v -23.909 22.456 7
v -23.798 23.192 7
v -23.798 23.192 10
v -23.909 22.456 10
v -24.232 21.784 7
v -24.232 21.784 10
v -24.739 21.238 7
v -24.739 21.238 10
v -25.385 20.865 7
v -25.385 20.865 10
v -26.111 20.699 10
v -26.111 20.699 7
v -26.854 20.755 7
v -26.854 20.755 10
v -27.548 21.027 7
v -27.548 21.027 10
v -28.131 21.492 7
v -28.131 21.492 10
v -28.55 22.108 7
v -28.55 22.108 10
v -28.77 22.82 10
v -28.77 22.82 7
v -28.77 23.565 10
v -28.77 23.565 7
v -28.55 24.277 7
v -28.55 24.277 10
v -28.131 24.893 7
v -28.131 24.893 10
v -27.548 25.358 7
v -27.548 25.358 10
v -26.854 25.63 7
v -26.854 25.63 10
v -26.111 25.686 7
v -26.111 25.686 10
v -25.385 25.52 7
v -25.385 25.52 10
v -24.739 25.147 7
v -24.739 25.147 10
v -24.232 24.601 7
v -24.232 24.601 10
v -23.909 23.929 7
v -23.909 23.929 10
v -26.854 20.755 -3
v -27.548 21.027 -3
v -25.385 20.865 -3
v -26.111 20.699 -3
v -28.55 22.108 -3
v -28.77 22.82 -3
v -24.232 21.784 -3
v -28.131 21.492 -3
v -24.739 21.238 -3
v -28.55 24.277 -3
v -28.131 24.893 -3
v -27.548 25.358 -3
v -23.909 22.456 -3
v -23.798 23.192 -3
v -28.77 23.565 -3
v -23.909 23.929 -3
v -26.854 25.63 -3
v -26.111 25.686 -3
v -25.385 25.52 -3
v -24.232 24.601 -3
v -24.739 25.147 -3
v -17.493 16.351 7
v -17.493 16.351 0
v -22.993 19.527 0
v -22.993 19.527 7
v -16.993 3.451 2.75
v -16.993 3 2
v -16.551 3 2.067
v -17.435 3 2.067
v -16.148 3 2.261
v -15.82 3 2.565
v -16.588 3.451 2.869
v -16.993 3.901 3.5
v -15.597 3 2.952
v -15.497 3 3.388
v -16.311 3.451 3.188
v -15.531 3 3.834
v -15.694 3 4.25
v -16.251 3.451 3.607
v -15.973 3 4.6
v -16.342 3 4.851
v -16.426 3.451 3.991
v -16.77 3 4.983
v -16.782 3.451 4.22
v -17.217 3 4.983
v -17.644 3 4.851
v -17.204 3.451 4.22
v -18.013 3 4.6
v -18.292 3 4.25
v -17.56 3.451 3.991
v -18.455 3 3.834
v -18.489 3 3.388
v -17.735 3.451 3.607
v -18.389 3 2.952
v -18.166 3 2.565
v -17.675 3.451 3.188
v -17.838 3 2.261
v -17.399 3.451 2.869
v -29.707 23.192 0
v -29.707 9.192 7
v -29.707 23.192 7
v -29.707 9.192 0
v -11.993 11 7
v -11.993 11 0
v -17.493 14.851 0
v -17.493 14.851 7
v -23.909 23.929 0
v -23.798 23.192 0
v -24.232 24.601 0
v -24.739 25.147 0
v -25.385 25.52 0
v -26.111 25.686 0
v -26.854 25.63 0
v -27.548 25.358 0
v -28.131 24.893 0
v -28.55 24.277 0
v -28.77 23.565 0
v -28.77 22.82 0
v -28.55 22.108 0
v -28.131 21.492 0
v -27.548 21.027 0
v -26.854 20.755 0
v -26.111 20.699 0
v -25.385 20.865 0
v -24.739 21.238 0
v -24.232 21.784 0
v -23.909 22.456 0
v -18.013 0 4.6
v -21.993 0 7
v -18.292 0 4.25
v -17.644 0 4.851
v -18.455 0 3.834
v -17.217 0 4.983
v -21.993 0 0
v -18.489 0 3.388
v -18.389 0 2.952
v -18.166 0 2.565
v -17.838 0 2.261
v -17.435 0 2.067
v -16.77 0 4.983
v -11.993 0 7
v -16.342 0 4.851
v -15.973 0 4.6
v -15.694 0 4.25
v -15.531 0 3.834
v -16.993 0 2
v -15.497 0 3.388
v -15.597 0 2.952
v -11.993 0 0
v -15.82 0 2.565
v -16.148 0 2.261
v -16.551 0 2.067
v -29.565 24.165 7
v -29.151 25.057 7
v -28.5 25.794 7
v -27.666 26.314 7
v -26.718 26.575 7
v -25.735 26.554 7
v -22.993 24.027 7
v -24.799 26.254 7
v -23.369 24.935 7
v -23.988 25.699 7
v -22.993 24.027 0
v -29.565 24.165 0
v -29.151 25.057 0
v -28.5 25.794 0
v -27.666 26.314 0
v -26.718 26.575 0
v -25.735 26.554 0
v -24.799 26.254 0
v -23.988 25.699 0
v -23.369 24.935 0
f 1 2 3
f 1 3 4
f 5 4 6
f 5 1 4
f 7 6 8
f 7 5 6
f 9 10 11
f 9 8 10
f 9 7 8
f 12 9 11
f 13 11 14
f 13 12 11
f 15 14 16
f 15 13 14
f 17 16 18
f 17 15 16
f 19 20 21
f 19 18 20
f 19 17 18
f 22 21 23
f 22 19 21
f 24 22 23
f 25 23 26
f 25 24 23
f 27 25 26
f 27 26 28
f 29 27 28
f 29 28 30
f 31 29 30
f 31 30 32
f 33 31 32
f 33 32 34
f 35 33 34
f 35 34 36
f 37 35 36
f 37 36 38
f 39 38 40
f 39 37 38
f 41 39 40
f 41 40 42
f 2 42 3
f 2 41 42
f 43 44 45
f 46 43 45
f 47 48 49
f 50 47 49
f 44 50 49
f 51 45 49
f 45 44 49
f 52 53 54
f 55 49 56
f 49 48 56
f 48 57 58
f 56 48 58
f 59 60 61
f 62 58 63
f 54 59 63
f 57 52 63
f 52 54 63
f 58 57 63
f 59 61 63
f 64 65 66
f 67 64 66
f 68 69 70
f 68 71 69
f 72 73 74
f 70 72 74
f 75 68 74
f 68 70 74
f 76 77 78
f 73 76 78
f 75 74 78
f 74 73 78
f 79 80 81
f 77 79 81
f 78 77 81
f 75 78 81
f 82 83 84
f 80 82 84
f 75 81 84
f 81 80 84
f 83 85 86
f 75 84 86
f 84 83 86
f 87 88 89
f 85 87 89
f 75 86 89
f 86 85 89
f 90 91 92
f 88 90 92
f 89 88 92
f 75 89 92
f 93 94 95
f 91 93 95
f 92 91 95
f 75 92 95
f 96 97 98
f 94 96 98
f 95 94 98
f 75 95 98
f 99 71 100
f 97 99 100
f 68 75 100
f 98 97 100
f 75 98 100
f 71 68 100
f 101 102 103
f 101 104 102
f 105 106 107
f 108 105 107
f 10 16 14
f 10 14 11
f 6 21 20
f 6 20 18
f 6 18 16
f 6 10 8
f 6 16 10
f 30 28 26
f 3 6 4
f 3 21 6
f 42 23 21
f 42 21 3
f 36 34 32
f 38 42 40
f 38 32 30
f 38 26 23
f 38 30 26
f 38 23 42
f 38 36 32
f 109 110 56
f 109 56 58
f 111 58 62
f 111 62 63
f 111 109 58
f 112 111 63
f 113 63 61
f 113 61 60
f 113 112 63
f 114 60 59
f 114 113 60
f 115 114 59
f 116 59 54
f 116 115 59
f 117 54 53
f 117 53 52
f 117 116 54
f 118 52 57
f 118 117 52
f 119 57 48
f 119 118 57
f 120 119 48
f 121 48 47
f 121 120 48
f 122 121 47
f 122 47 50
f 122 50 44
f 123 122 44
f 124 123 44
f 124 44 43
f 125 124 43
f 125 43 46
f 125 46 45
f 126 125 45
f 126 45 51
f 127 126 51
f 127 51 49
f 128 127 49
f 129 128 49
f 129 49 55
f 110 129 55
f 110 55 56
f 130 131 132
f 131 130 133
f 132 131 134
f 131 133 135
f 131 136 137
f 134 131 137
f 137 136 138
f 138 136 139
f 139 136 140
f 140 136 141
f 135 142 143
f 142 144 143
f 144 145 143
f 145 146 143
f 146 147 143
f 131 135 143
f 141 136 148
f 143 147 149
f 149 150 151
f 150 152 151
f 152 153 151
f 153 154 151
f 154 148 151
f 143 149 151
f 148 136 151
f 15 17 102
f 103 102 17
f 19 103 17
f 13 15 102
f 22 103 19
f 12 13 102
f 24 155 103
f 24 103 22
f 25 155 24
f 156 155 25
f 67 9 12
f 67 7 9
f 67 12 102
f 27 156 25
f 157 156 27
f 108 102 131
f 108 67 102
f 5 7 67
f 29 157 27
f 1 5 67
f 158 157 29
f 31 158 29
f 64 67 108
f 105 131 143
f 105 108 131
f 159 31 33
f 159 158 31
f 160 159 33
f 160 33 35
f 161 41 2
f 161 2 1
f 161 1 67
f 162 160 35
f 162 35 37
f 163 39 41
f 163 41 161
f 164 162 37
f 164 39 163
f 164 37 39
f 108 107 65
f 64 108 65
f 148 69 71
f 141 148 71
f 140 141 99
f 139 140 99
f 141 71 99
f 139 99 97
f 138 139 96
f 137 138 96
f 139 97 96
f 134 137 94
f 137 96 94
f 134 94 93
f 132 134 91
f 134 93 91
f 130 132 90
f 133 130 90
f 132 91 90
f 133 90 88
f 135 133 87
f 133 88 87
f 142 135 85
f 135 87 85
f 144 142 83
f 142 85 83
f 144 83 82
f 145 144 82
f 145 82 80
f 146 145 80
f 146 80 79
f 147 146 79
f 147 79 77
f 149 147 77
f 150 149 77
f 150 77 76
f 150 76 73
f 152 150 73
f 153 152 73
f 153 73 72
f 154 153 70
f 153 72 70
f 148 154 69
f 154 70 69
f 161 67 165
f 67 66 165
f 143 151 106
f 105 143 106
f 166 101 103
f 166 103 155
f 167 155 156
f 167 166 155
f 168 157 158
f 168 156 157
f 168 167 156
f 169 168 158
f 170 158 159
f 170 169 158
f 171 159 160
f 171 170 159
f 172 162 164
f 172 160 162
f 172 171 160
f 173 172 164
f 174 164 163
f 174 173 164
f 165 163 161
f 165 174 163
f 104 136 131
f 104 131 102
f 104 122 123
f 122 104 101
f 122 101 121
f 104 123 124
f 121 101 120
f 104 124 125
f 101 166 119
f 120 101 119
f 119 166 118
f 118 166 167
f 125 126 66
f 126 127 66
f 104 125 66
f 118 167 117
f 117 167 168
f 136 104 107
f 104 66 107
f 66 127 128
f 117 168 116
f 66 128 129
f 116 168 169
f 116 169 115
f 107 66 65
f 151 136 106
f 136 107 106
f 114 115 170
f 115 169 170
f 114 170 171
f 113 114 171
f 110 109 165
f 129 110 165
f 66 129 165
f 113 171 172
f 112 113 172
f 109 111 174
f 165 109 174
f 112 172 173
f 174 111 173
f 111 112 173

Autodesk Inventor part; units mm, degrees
ref_plane "YZ Plane" through (0, 0, 0) normal (1, 0, 0) x (0, 1, 0)
ref_plane "XZ Plane" through (0, 0, 0) normal (0, 1, 0) x (-1, 0, 0)
ref_plane "XY Plane" through (0, 0, 0) normal (0, 0, 1) x (1, 0, 0)
sketch "Sketch1" plane through (0, 0, 0) normal (0, 0, 1) x (1, 0, 0)
  line L0 (-21.9931, 0) -> (-11.9931, 0)
  line L1 (-11.9931, 0) -> (-11.9931, 11)
  line L2 (-21.9931, 0) -> (-29.7066, 9.1925)
  line L3 (-29.7066, 9.1925) -> (-29.7066, 23.1925)
  line L4 (-11.9931, 11) -> (-17.4931, 14.8511)
  line L5 (-17.4931, 14.8511) -> (-17.4931, 16.3511)
  line L6 (-17.4931, 16.3511) -> (-22.9931, 19.5266)
  line L7 (-22.9931, 19.5266) -> (-22.9931, 24.0266)
  arc A0 (-22.9931, 24.0266) -> (-29.7066, 23.1925) centre (-26.298, 23.1925) ccw
  line L8 (-36.09, 0) -> (6.015, 0) projected
  point P0 (0, 0)
  dimension "d0" = 10
  dimension "d1" = 11
  dimension "d2" = 5.5
  dimension "d4" = 5.5
  dimension "d5" = 12
  dimension "d6" = 14
  dimension "d7" = 1.5
  dimension "d9" = 130
  dimension "d10" = 125
  dimension "d12" = 4.5
  dimension "d13" = 120
extrude "Extrusion1" add sketch "Sketch1" along normal blind 7
sketch "Sketch3" plane through (-21.9931, 0, 0) normal (0, -1, 0) x (1, 0, 0)
  circle A0 centre (5, 3.5) radius 1.5
  line L0 (0, 7) -> (10, 7) projected
  line L1 (10, 0) -> (10, 7) projected
  line L2 (0, 0) -> (0, 7) projected
  point P0 (21.9931, 0)
  dimension "d23" = 3.5
  dimension "d24" = 5
  dimension "d33" = 3
hole "Hole2" at (-16.9931, 0, 3.5) direction (0, 1, 0) diameter 3 depth 3 tip angle 118
sketch "Sketch4" plane through (0, 0, 7) normal (0, 0, 1) x (1, 0, 0)
  circle A0 centre (-49.3195, 43.5537) radius 2.5
  line L0 (-29.7066, 9.1925) -> (-21.9931, 0) projected
  line L1 (-21.9931, 0) -> (-11.9931, 0) projected
  line L2 (-11.9931, 0) -> (-11.9931, 11) projected
  line L3 (-11.9931, 11) -> (-17.4931, 14.8511) projected
  line L4 (-17.4931, 14.8511) -> (-17.4931, 16.3511) projected
  line L5 (-17.4931, 16.3511) -> (-22.9931, 19.5266) projected
  line L6 (-22.9931, 19.5266) -> (-22.9931, 24.0266) projected
  arc A1 (-22.9931, 24.0266) -> (-29.7066, 23.1925) centre (-26.298, 23.1925) ccw projected
  line L7 (-29.7066, 23.1925) -> (-29.7066, 9.1925) projected
  circle A2 centre (-26.298, 23.1925) radius 2.5
  point P0 (0, 0)
  dimension "d34" = 5
  dimension "d35" = 5
extrude "Extrusion2" add sketch "Sketch4" along normal blind 3 and the other way blind 10 contours A2
properties part number "McCrea_velky_krk_walle"
